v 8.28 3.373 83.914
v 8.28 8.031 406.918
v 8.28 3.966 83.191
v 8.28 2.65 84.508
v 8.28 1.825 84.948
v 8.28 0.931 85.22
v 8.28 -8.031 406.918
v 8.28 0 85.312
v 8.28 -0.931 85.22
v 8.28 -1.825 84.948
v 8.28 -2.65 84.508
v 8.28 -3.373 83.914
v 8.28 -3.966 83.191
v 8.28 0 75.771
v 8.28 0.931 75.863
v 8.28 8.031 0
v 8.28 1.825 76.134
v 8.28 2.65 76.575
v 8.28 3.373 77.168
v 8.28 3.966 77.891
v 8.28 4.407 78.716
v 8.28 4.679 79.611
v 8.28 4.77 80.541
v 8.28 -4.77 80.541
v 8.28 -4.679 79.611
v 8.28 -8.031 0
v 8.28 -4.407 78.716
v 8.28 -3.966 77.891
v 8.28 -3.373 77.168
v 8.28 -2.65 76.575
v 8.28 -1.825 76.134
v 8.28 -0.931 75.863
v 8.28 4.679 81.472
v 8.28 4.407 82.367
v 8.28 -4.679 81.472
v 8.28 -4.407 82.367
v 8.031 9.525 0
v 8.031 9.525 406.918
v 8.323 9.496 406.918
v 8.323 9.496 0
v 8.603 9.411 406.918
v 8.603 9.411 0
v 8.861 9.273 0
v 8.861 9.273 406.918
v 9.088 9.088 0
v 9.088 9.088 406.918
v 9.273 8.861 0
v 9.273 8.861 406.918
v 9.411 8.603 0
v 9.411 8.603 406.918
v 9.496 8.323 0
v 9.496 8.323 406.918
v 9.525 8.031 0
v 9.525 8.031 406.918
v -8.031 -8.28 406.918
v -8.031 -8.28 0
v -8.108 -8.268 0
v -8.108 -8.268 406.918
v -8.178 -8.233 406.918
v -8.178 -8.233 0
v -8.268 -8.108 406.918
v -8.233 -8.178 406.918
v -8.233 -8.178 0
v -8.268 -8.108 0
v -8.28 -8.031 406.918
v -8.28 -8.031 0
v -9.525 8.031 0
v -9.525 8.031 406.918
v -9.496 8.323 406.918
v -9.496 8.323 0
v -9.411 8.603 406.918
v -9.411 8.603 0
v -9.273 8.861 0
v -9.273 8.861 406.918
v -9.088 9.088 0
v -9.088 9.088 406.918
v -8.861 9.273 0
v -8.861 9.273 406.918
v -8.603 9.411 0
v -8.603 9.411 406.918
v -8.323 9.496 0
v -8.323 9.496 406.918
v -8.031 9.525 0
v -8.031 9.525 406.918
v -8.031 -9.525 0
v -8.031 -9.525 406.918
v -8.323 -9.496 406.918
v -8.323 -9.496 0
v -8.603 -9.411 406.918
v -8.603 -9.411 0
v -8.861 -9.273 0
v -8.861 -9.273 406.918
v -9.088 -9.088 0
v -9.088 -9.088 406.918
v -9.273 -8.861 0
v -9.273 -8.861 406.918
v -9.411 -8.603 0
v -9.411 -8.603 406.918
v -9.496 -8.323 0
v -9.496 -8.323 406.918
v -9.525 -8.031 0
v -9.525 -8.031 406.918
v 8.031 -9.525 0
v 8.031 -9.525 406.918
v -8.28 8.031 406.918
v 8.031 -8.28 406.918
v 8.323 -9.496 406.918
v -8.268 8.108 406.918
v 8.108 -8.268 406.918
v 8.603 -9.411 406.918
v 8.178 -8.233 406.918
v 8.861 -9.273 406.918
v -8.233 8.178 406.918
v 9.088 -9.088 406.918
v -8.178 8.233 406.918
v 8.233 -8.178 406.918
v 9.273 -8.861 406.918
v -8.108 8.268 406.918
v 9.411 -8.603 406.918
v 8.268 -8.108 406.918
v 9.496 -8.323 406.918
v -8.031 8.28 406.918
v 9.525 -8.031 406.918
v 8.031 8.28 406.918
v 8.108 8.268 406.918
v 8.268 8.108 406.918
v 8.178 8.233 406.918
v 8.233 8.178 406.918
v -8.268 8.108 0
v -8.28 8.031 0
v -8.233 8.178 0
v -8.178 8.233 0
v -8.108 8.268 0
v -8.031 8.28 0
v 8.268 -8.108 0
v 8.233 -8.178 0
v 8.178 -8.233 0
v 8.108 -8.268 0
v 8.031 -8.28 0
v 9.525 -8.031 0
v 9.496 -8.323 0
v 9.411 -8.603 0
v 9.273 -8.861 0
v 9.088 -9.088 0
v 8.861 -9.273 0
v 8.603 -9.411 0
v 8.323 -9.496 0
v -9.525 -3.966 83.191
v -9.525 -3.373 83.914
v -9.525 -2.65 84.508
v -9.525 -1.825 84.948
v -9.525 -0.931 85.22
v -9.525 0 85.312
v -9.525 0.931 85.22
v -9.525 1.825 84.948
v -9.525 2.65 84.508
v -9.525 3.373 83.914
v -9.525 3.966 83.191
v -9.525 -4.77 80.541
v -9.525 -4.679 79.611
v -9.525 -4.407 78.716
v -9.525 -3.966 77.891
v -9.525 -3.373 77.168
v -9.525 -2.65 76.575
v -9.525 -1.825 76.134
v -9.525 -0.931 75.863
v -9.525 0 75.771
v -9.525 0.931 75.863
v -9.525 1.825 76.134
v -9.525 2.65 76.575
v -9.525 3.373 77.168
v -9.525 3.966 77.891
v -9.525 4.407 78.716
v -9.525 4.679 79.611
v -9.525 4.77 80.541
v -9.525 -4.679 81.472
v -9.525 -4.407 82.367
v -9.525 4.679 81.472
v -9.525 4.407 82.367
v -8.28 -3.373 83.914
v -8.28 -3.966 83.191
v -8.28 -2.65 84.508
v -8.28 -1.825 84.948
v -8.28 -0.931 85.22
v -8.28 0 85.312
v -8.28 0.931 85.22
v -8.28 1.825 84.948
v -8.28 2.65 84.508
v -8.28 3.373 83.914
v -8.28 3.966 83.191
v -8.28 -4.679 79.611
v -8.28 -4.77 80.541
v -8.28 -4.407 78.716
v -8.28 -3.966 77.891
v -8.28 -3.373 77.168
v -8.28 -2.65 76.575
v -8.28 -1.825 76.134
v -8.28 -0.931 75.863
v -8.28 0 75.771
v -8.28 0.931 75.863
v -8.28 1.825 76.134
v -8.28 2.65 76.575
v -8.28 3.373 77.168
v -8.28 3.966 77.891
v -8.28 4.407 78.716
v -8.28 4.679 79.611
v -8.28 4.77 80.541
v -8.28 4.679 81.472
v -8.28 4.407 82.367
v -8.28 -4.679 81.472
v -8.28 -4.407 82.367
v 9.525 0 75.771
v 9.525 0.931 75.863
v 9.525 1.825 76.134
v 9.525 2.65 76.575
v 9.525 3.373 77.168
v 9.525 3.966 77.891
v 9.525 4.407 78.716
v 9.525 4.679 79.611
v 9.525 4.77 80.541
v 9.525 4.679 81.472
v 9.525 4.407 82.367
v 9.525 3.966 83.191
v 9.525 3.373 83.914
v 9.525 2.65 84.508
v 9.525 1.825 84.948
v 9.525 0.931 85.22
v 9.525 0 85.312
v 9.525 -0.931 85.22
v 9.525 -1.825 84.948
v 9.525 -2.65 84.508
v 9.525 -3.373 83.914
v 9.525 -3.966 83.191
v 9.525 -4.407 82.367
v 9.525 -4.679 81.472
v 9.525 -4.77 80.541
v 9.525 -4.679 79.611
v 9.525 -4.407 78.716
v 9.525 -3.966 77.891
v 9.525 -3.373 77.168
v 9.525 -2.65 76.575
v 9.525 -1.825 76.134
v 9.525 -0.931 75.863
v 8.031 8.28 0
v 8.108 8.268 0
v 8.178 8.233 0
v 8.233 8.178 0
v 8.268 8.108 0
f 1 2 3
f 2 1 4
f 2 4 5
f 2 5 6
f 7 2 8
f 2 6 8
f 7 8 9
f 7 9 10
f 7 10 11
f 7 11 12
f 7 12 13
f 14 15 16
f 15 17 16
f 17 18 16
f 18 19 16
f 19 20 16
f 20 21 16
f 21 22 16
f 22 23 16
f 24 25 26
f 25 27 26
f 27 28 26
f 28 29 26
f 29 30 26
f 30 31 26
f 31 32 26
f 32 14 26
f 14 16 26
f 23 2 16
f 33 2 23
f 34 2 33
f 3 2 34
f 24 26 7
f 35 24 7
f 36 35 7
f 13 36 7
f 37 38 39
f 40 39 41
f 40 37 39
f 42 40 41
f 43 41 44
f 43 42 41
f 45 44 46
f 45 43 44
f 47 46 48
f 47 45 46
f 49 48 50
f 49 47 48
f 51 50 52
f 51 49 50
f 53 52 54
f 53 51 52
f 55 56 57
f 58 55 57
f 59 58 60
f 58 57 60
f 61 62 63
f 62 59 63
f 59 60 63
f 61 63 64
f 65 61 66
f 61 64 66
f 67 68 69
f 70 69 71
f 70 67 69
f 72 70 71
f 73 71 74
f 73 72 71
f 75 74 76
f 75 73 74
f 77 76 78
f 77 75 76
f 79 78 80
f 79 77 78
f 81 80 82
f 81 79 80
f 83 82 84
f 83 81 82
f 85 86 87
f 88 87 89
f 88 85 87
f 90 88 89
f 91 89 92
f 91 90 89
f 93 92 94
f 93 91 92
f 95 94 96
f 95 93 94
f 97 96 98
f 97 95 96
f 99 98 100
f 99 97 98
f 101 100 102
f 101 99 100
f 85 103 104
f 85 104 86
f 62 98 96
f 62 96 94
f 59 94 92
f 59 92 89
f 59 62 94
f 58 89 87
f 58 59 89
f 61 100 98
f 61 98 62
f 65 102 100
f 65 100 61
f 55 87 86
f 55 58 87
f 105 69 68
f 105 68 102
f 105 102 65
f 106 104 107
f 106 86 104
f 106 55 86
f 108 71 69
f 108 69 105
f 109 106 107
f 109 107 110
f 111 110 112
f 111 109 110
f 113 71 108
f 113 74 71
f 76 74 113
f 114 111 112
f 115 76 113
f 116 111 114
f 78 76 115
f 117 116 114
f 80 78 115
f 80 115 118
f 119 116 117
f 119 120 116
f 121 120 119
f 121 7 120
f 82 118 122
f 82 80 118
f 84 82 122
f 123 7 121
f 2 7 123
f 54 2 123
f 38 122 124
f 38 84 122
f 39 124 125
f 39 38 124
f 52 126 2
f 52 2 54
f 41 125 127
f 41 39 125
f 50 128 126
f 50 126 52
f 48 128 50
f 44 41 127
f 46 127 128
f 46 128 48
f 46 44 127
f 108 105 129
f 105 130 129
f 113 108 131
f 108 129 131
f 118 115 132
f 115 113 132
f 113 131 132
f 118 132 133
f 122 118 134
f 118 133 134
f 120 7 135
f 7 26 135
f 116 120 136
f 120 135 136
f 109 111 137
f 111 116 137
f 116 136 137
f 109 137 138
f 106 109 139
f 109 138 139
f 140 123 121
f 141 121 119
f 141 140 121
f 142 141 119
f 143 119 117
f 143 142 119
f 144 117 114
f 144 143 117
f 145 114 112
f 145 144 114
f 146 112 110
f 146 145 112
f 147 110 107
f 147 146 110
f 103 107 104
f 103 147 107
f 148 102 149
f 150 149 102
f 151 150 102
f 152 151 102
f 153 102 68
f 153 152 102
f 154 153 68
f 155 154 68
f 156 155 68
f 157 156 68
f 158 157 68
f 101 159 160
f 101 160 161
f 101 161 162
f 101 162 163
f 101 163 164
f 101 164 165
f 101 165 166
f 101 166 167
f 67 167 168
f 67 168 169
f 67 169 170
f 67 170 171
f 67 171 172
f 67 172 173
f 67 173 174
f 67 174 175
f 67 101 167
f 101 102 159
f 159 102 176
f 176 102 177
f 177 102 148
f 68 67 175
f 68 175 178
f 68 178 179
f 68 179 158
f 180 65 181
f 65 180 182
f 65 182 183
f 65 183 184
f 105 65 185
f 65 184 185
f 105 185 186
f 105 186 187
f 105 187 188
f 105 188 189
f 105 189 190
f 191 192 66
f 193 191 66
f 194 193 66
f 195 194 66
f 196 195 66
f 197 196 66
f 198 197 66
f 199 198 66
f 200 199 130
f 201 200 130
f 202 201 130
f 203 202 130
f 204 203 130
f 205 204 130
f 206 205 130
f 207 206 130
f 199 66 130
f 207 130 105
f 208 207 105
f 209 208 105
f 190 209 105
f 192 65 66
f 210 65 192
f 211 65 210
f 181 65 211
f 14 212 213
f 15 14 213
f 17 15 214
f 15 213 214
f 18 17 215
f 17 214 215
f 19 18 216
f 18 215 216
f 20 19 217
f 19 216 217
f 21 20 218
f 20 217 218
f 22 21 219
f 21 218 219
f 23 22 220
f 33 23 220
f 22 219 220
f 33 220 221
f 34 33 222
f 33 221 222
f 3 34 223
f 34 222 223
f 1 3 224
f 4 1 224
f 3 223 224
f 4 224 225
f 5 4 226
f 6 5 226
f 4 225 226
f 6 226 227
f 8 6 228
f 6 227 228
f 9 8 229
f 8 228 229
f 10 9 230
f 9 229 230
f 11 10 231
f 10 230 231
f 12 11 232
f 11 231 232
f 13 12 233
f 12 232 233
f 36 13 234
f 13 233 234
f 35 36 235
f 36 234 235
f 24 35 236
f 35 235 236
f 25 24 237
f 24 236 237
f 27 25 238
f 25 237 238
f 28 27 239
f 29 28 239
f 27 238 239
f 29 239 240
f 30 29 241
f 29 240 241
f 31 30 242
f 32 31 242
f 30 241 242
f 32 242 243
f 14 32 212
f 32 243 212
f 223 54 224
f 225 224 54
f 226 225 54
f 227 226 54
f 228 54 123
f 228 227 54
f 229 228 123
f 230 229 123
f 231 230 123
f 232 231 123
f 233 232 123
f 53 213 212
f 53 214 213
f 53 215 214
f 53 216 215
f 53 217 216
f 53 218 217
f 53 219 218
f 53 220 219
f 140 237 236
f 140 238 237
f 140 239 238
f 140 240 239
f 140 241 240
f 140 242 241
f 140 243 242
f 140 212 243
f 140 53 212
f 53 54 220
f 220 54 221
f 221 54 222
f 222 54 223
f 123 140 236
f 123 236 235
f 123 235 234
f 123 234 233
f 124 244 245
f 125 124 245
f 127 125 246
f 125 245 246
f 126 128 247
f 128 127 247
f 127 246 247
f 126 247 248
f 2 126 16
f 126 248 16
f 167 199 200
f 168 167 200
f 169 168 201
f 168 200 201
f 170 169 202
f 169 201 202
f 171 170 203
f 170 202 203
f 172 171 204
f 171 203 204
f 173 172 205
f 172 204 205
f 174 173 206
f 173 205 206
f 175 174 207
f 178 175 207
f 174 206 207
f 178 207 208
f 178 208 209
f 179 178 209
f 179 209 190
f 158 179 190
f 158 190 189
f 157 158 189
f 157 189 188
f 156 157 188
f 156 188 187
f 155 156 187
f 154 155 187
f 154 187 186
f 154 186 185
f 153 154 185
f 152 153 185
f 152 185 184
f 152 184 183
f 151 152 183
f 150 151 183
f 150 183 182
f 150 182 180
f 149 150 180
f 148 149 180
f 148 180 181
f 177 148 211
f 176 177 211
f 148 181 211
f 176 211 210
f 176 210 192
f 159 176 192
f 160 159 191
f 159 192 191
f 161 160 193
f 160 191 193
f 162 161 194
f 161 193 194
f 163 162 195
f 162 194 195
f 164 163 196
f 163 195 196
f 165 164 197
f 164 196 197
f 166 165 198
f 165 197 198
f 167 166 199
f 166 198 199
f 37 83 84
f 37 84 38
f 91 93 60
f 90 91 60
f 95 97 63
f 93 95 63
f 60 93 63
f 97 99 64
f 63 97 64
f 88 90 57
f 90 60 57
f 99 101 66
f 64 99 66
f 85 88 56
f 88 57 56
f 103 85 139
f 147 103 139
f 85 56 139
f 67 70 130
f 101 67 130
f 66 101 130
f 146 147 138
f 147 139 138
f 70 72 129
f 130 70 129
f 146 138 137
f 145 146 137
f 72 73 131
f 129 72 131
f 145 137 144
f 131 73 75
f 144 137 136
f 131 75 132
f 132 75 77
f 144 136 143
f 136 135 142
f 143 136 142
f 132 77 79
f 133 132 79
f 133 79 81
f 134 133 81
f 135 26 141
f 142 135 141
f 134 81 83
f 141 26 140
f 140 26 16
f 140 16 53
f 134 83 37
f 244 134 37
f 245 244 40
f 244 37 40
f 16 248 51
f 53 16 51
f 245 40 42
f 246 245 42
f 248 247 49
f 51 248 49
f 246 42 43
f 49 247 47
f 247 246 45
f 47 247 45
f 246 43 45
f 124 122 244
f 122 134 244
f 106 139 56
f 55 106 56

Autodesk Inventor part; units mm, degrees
ref_plane "YZ Plane" through (0, 0, 0) normal (1, 0, 0) x (0, 1, 0)
ref_plane "Start Plane" through (0, 0, 0) normal (0, 0, 1) x (1, 0, 0)
ref_plane "End Plane" through (0, 0, 406.9182) normal (0, 0, 1) x (1, 0, 0)
sketch "Sketch" plane through (0, 0, 0) normal (0, 0, 1) x (1, 0, 0)
  line L0 (-9.525, -8.0315) -> (-9.525, 8.0315)
  line L1 (-8.0315, 9.525) -> (8.0315, 9.525)
  line L2 (9.525, 8.0315) -> (9.525, -8.0315)
  line L3 (8.0315, -9.525) -> (-8.0315, -9.525)
  arc A0 (-9.525, -8.0315) -> (-8.0315, -9.525) centre (-8.0315, -8.0315) ccw
  arc A1 (-8.0315, 9.525) -> (-9.525, 8.0315) centre (-8.0315, 8.0315) ccw
  arc A2 (9.525, 8.0315) -> (8.0315, 9.525) centre (8.0315, 8.0315) ccw
  arc A3 (8.0315, -9.525) -> (9.525, -8.0315) centre (8.0315, -8.0315) ccw
  arc A4 (-8.0315, 8.2804) -> (-8.2804, 8.0315) centre (-8.0315, 8.0315) ccw
  line L4 (-8.0315, 8.2804) -> (8.0315, 8.2804)
  arc A5 (8.2804, 8.0315) -> (8.0315, 8.2804) centre (8.0315, 8.0315) ccw
  line L5 (8.2804, 8.0315) -> (8.2804, -8.0315)
  arc A6 (8.0315, -8.2804) -> (8.2804, -8.0315) centre (8.0315, -8.0315) ccw
  line L6 (8.0315, -8.2804) -> (-8.0315, -8.2804)
  arc A7 (-8.2804, -8.0315) -> (-8.0315, -8.2804) centre (-8.0315, -8.0315) ccw
  line L7 (-8.2804, -8.0315) -> (-8.2804, 8.0315)
  line L8 (0, 13.768) -> (0, -13.768) construction
  line L9 (-13.8012, 0) -> (13.9669, 0) construction
  dimension "d10" = 19.05
  dimension "d11" = 19.05
  dimension "d12" = 1.2446
  dimension "d15" = 9.525
  dimension "d16" = 9.525
  dimension "d17" = 1.4935
extrude "Body" add sketch "Sketch" along normal up to surface (406.9182 mm away) from surface at 0
sketch "Sketch3" plane through (0, 0, 0) normal (0, 0, 1) x (1, 0, 0)
  line L0 (0, 0) -> (10, 0)
ref_plane "Work Plane3" through (0, 0, 0) normal (0, -1, 0) x (1, 0, 0)
sketch "Sketch5" plane through (9.525, -8.0315, 406.9182) normal (1, 0, 0) x (0, 0, -1)
  circle A0 centre (326.3769, 8.0315) radius 4.7702
  line L0 (0, 16.063) -> (0, 0) projected
  line L1 (406.9182, 0) -> (0, 0) projected
  line L2 (406.9182, 16.063) -> (406.9182, 0) projected
  line L3 (406.9182, 16.063) -> (0, 16.063) projected
  line L4 (406.9182, 16.063) -> (406.9182, 0) projected
  point P0 (406.9182, 8.0315)
  point P1 (406.9182, 8.0315)
extrude "Extrusion2" cut sketch "Sketch5" against normal through all contours A0
sketch "Sketch4" plane through (0, 0, 0) normal (0, -1, 0) x (1, 0, 0)
  line L0 (-2, 0) -> (12, 0) projected
  line L1 (-2, 406.9182) -> (12, 406.9182) projected
  dimension "d19" = 406.9182
equation "\"d10\" = G_H"
equation "\"d11\" = G_W"
equation "\"d12\" = G_T"
equation "\"d15\" = 0.5 * d10"
equation "\"d16\" = 0.5 * d11"
equation "\"d17\" = G_IR"
equation "\"d3\" = G_L"
equation "\"G_W\" = 19.05"
equation "\"G_H\" = 19.05"
equation "\"G_T\" = 1.2446"
equation "\"G_IR\" = 1.2 * G_T"
equation "\"G_L\" = d19"
equation "\"G_OFFSET_START\" = 0"
equation "\"G_OFFSET_END\" = 0"
equation "\"d14\" = G_OFFSET_END + B_L"
equation "\"B_L\" = 406.91824"
properties part number "ASTM A513 - 3/4 x 3/4 x 49/1000 - 16.02" material "Steel, Mild"
